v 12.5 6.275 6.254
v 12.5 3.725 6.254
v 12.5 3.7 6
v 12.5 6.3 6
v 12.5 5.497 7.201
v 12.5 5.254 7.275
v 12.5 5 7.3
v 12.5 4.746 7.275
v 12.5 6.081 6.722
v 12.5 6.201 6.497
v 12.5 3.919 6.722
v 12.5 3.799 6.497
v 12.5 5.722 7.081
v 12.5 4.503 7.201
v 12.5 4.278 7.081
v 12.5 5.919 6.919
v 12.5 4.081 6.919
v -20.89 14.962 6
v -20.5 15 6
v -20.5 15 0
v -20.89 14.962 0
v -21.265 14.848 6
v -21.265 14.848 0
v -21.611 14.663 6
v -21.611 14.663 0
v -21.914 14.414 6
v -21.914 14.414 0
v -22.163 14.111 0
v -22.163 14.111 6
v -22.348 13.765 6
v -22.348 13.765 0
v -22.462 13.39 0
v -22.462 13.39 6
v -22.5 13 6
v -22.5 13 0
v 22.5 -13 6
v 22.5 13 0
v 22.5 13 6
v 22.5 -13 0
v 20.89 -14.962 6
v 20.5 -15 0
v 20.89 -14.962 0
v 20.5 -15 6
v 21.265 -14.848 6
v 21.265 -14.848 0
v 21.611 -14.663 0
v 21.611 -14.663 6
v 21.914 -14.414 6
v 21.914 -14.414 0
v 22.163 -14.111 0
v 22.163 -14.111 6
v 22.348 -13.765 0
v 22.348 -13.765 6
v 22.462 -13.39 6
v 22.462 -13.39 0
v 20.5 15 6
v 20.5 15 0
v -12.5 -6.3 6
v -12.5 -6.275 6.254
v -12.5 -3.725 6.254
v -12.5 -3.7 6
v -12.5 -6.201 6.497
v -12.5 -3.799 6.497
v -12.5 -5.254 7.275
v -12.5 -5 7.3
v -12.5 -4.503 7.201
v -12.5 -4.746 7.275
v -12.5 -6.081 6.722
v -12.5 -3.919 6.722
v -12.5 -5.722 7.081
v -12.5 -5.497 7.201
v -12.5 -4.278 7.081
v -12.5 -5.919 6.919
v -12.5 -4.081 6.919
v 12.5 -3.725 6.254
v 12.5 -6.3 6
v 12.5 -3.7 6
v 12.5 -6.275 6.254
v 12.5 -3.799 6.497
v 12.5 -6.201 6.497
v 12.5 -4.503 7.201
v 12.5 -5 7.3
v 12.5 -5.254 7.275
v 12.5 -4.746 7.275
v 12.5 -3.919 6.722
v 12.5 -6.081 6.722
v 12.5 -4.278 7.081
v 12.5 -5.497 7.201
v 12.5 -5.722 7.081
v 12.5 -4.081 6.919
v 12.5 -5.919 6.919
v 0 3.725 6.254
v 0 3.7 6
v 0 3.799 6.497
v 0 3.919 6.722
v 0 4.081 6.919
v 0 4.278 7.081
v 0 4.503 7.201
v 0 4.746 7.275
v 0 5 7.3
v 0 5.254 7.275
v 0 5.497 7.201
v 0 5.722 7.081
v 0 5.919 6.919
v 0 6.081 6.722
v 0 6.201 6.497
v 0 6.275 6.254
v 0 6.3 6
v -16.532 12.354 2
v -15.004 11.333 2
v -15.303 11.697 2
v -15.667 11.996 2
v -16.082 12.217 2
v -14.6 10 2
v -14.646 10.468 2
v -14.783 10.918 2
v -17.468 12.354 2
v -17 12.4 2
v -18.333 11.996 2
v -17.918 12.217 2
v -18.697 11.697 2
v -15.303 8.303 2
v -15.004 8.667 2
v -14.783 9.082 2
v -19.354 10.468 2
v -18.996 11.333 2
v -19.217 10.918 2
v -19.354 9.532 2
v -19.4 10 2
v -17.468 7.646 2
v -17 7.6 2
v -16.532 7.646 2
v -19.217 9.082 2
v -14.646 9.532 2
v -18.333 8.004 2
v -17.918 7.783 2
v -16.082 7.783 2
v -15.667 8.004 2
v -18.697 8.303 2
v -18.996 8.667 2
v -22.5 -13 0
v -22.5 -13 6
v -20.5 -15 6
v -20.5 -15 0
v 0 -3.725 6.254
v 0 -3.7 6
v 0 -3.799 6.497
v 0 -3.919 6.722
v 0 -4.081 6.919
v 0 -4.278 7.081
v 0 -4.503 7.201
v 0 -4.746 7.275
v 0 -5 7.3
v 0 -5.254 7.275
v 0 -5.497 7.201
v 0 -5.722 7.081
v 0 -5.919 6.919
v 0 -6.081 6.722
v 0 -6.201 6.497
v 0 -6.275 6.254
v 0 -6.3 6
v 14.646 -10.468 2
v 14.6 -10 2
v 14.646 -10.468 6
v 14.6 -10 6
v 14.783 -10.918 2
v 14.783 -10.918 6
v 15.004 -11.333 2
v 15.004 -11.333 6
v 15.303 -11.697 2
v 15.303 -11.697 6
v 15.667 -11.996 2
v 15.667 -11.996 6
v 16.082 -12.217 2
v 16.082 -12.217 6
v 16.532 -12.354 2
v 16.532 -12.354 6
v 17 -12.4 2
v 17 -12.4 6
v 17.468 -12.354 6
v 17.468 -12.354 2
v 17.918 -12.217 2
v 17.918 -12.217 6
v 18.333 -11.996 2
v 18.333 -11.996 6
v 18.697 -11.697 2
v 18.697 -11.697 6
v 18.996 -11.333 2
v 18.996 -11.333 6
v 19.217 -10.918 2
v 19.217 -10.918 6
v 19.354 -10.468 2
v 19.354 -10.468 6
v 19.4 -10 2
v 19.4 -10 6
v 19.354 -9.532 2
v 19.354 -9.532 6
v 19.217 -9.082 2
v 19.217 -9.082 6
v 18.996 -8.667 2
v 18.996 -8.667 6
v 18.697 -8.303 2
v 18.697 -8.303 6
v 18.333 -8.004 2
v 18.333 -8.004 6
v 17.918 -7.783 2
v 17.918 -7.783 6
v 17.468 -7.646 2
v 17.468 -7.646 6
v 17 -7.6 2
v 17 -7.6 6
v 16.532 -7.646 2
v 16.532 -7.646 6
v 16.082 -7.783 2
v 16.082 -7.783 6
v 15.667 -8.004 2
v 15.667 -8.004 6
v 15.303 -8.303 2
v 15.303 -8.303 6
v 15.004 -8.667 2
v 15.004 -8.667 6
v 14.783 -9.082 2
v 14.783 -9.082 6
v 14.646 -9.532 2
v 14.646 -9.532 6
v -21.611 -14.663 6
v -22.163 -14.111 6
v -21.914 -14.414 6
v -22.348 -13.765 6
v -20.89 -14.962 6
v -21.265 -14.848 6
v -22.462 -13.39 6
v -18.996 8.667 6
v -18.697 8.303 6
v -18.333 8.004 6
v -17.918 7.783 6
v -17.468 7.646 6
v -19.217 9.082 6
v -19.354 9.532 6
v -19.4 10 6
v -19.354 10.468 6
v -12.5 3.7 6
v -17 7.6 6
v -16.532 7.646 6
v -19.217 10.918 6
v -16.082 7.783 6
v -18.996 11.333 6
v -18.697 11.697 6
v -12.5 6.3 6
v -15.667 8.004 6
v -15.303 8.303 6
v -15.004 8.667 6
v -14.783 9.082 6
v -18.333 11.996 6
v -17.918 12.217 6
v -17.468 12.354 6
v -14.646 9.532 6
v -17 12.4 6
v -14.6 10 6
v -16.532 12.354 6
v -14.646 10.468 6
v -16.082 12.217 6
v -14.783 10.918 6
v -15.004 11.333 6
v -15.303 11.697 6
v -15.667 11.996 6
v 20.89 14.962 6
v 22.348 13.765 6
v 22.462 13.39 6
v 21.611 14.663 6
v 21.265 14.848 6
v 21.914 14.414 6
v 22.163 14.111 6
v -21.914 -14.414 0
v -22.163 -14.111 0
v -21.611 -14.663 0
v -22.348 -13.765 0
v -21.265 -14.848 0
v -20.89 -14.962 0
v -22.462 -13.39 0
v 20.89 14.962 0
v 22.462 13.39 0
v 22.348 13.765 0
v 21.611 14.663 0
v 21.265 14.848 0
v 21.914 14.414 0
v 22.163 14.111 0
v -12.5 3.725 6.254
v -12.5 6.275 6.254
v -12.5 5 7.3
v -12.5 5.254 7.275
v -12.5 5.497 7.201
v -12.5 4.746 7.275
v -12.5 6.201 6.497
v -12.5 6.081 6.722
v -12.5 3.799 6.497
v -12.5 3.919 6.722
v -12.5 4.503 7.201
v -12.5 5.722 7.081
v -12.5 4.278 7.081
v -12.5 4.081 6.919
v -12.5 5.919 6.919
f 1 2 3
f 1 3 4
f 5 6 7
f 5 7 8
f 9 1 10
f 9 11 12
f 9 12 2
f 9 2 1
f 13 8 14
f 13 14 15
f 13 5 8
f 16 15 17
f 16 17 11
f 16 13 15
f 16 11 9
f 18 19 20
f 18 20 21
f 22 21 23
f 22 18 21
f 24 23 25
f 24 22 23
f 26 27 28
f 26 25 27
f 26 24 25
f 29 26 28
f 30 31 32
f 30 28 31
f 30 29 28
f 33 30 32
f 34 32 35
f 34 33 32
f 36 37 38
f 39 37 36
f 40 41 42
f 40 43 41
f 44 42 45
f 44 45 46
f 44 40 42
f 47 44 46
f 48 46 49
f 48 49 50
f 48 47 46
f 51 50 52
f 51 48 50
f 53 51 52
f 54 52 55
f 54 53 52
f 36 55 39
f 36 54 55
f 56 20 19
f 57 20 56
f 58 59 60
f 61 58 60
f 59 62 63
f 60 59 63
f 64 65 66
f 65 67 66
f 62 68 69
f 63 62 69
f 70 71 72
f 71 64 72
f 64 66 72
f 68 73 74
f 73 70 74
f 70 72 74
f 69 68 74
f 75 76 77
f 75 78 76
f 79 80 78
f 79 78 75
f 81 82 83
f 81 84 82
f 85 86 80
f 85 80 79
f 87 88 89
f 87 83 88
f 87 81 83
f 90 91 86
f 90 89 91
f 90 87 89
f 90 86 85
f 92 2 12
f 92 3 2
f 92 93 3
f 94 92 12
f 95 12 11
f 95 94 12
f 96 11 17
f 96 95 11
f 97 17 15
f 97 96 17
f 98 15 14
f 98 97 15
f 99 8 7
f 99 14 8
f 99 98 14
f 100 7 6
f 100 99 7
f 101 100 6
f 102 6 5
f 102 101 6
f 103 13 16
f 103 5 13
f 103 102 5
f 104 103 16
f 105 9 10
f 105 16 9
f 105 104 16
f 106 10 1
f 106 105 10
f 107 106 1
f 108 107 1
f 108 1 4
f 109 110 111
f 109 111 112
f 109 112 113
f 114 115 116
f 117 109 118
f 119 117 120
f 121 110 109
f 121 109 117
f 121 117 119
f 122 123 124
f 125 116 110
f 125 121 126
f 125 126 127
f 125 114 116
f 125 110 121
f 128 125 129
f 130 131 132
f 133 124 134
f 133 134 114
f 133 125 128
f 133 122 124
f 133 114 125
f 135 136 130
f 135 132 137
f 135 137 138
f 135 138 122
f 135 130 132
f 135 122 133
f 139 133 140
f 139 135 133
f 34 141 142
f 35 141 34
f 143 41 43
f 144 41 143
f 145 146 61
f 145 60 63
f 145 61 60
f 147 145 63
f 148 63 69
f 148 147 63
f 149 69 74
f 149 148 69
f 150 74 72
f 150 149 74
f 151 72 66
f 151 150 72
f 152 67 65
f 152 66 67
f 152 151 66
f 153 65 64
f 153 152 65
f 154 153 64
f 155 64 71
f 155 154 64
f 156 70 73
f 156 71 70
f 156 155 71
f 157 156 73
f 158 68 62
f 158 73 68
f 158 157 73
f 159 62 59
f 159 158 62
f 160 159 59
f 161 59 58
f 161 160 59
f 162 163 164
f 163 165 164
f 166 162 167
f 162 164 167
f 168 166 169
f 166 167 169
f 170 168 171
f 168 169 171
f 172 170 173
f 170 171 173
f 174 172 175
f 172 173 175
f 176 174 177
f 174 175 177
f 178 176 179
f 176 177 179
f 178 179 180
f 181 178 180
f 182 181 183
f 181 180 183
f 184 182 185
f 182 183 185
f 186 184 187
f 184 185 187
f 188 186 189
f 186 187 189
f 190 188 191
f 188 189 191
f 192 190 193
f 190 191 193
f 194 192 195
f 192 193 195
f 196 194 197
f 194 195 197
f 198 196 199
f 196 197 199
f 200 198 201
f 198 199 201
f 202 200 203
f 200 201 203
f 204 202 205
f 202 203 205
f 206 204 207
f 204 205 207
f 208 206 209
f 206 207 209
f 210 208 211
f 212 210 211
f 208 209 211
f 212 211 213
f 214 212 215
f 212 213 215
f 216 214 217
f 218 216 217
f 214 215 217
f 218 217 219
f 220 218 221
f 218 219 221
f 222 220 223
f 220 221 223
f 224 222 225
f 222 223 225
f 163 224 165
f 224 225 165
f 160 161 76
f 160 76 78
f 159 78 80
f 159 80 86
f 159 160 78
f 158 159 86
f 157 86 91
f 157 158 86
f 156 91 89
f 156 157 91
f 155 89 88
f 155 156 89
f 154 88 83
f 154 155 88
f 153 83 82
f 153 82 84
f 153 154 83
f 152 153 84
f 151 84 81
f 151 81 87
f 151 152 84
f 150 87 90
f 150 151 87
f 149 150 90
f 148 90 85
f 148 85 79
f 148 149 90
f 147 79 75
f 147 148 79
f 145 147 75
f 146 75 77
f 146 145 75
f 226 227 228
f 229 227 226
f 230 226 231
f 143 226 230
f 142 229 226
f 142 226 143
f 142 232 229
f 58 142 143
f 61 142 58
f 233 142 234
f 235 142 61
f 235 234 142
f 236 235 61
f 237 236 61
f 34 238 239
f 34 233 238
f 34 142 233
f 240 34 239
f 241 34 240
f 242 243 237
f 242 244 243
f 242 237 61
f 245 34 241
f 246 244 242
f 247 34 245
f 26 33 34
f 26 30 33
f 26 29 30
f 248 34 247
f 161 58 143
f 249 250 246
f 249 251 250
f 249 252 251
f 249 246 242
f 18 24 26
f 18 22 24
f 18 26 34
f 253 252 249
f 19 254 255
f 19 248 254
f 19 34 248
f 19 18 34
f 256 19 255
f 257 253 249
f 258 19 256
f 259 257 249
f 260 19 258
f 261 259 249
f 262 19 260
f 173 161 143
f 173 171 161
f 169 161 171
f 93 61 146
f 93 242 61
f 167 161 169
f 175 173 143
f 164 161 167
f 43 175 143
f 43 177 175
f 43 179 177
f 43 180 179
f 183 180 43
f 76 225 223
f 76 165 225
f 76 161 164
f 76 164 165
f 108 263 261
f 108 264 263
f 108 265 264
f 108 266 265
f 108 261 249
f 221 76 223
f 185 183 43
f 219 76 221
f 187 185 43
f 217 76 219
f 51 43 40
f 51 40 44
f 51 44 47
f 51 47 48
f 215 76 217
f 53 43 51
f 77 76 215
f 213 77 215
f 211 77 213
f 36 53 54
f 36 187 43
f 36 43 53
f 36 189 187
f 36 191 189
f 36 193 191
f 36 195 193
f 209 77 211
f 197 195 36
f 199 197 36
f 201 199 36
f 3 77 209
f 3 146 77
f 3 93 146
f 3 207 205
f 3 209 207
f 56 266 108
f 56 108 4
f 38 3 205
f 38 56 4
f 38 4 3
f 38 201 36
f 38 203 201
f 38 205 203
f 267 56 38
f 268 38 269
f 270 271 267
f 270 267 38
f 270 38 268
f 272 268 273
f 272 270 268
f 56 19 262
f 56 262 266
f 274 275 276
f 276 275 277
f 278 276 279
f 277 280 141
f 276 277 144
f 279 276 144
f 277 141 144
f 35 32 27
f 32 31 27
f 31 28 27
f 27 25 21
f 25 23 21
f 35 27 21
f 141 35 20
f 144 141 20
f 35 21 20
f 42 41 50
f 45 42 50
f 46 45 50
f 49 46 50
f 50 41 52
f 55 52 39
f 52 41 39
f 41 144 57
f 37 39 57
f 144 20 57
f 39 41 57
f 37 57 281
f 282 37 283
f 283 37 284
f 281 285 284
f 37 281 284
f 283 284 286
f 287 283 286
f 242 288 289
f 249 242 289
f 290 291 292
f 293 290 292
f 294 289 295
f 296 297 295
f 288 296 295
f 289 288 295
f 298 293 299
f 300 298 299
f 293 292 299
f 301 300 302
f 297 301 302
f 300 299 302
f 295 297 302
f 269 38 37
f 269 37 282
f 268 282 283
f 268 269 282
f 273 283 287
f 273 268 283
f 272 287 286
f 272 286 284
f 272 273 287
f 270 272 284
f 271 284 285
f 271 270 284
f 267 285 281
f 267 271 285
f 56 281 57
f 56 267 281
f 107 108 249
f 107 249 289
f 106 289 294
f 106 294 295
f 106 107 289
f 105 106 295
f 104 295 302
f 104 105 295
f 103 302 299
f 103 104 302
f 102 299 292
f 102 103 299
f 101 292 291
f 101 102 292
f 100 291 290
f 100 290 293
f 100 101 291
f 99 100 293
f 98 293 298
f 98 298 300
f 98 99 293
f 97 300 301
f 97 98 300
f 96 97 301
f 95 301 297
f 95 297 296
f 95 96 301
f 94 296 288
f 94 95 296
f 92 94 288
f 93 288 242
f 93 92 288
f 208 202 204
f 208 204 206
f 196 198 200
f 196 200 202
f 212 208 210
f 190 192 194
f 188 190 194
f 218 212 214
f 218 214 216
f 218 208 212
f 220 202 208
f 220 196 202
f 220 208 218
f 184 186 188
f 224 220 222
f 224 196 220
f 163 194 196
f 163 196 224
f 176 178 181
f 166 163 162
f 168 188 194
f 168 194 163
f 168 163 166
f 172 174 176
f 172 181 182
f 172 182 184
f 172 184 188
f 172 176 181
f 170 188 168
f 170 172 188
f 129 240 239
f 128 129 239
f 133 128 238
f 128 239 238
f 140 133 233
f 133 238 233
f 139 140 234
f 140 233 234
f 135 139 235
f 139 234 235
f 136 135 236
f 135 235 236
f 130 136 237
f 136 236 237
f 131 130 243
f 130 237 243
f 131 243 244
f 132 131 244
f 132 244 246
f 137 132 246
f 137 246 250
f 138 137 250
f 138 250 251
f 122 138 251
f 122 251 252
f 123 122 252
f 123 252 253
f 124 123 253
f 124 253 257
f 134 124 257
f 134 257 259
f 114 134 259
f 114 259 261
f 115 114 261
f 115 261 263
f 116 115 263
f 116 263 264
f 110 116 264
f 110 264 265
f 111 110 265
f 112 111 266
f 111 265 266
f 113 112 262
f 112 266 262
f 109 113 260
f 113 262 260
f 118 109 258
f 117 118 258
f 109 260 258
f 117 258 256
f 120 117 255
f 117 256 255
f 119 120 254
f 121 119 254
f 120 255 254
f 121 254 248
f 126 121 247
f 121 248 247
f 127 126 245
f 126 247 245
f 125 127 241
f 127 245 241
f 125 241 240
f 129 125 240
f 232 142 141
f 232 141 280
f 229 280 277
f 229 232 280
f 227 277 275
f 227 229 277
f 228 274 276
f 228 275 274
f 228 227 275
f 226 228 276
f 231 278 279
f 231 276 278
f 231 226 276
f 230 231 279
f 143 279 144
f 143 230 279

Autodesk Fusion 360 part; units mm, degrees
sketch "草图1" plane through (0, 0, 0) normal (0, 0, 1) x (1, 0, 0)
  line L0 (22.5, -15) -> (-22.5, -15)
  line L1 (-22.5, -15) -> (-22.5, 15)
  line L2 (-22.5, 15) -> (22.5, 15)
  line L3 (22.5, 15) -> (22.5, -15)
  line L4 (22.5, -15) -> (-22.5, 15) construction
  line L5 (-22.5, -15) -> (22.5, 15) construction
  dimension "d27" = 45
  dimension "d28" = 30
extrude "拉伸1" add sketch "草图1" along normal blind 6
sketch "草图2" plane through (0, 0, 0) normal (1, 0, 0) x (0, 1, 0)
sketch "草图3" plane through (0, 0, 0) normal (1, 0, 0) x (0, 1, 0)
  circle A0 centre (5, 6) radius 1.3
  dimension "d31" = 2.6
extrude "拉伸2" add sketch "草图3" along normal blind 12.5 and the other way blind 12.5
mirror "镜像1" about plane through (0, 0, 0) normal (0, 1, 0) of "拉伸2"
sketch "草图4" plane through (0, 0, 6) normal (0, 0, 1) x (-1, 0, 0)
  line L0 (12.5, 6.3) -> (12.5, 3.7)
  line L1 (12.5, 3.7) -> (-12.5, 3.7)
  line L2 (-12.5, 3.7) -> (-12.5, 6.3)
  line L3 (-12.5, 6.3) -> (12.5, 6.3)
  line L4 (12.5, -3.7) -> (12.5, -6.3)
  line L5 (12.5, -6.3) -> (-12.5, -6.3)
  line L6 (-12.5, -6.3) -> (-12.5, -3.7)
  line L7 (-12.5, -3.7) -> (12.5, -3.7)
  line L8 (-22.5, -15) -> (22.5, -15)
  line L9 (22.5, -15) -> (22.5, 15)
  line L10 (22.5, 15) -> (-22.5, 15)
  line L11 (-22.5, 15) -> (-22.5, -15)
fillet "圆角1" radius 2 4 edges at (22.5, 15, 3) (22.5, -15, 3) (-22.5, -15, 3) (-22.5, 15, 3)
sketch "草图5" plane through (0, 0, 6) normal (0, 0, 1) x (-1, 0, 0)
  line L0 (12.5, 6.3) -> (12.5, 3.7)
  line L1 (12.5, 3.7) -> (-12.5, 3.7)
  line L2 (-12.5, 3.7) -> (-12.5, 6.3)
  line L3 (-12.5, 6.3) -> (12.5, 6.3)
  line L4 (12.5, -3.7) -> (12.5, -6.3)
  line L5 (12.5, -6.3) -> (-12.5, -6.3)
  line L6 (-12.5, -6.3) -> (-12.5, -3.7)
  line L7 (-12.5, -3.7) -> (12.5, -3.7)
  arc A0 (20.5, -15) -> (22.5, -13) centre (20.5, -13) ccw
  line L8 (22.5, -13) -> (22.5, 13)
  arc A1 (22.5, 13) -> (20.5, 15) centre (20.5, 13) ccw
  line L9 (20.5, 15) -> (-20.5, 15)
  arc A2 (-20.5, 15) -> (-22.5, 13) centre (-20.5, 13) ccw
  line L10 (-22.5, 13) -> (-22.5, -13)
  arc A3 (-22.5, -13) -> (-20.5, -15) centre (-20.5, -13) ccw
  line L11 (-20.5, -15) -> (20.5, -15)
  circle A4 centre (-17, 10) radius 2.4
  dimension "d44" = 4.8
extrude "拉伸4" cut sketch "草图5" against normal blind 4 contours A4
sketch "草图6" plane through (0, 0, 6) normal (0, 0, 1) x (-1, 0, 0)
  circle A0 centre (-17, 10) radius 2.4
  line L0 (12.5, 6.3) -> (12.5, 3.7)
  line L1 (12.5, 3.7) -> (-12.5, 3.7)
  line L2 (-12.5, 3.7) -> (-12.5, 6.3)
  line L3 (-12.5, 6.3) -> (12.5, 6.3)
  line L4 (12.5, -3.7) -> (12.5, -6.3)
  line L5 (12.5, -6.3) -> (-12.5, -6.3)
  line L6 (-12.5, -6.3) -> (-12.5, -3.7)
  line L7 (-12.5, -3.7) -> (12.5, -3.7)
  arc A1 (20.5, -15) -> (22.5, -13) centre (20.5, -13) ccw
  line L8 (22.5, -13) -> (22.5, 13)
  arc A2 (22.5, 13) -> (20.5, 15) centre (20.5, 13) ccw
  line L9 (20.5, 15) -> (-20.5, 15)
  arc A3 (-20.5, 15) -> (-22.5, 13) centre (-20.5, 13) ccw
  line L10 (-22.5, 13) -> (-22.5, -13)
  arc A4 (-22.5, -13) -> (-20.5, -15) centre (-20.5, -13) ccw
  line L11 (-20.5, -15) -> (20.5, -15)
  circle A5 centre (17, -10) radius 2.4
  dimension "d47" = 4.8
extrude "拉伸5" cut sketch "草图6" against normal blind 4 contours A5
equation "Catheter_Diameter = 2.4 mm" comment "Flexible spring catheter outer diameter"
equation "Catheter_Assembly_Clearance = 0.2 mm" comment "Initial diametral assembly clearance between catheter and Ecoflex liner"
equation "Clamp_Groove_Diameter = 3.6 mm" comment "Hard clamp circular groove diameter"
equation "Pad_Outer_Diameter = Clamp_Groove_Diameter" comment "Ecoflex liner outer diameter driven by clamp groove"
equation "Pad_Outer_Radius = Pad_Outer_Diameter / 2" comment "Ecoflex liner outer radius"
equation "Pad_Inner_Diameter = Catheter_Diameter + Catheter_Assembly_Clearance" comment "Ecoflex liner inner diameter"
equation "Pad_Inner_Radius = Pad_Inner_Diameter / 2" comment "Ecoflex liner inner radius"
equation "Pad_Radial_Thickness = ( Pad_Outer_Diameter - Pad_Inner_Diameter ) / 2" comment "Nominal radial thickness of Ecoflex liner"
equation "Pad_Length = 25 mm" comment "Effective Ecoflex liner length"
equation "Mold_Length = 45 mm" comment "Overall mold length along X"
equation "Mold_Width = 30 mm" comment "Overall mold width along Y"
equation "Bottom_Mold_Thickness = 8 mm" comment "Bottom mold plate thickness"
equation "Top_Mold_Thickness = 6 mm" comment "Top mold plate thickness"
equation "Top_Mold_Base_Z = Bottom_Mold_Thickness" comment "Assembly Z height of top mold bottom parting face"
equation "Pad_Cavity_Offset_Y = 5 mm" comment "Centerline offset of the two cavities from mold center"
equation "Alignment_Pin_Diameter = 4 mm" comment "Printed alignment pin diameter on bottom mold"
equation "Alignment_Pin_Height = 3 mm" comment "Alignment pin height"
equation "Alignment_Hole_Diameter = 4.4 mm" comment "Alignment blind-hole diameter on top mold"
equation "Alignment_Hole_Depth = 3.4 mm" comment "Alignment blind-hole depth"
equation "Alignment_Pin_Offset_X = 17 mm" comment "Absolute X coordinate magnitude of alignment pins"
equation "Alignment_Pin_Offset_Y = 10 mm" comment "Absolute Y coordinate magnitude of alignment pins"
equation "Overflow_Channel_Width = 1 mm" comment "Optional V1 overflow-channel width; retained but not used in recommended V1"
equation "Overflow_Channel_Depth = 0.4 mm" comment "Optional V1 overflow-channel depth; retained but not used in recommended V1"
equation "Overflow_Well_Diameter = 6 mm" comment "Optional overflow-well diameter; retained but not used in recommended V1"
equation "Overflow_Well_Depth = 1 mm" comment "Optional overflow-well depth; retained but not used in recommended V1"
equation "Mold_Outer_Fillet = 2 mm" comment "External handling-edge fillet radius"
equation "d27 = Mold_Length"
equation "d28 = Mold_Width"
equation "d29 = Top_Mold_Thickness"
equation "d31 = Pad_Inner_Diameter"
equation "d32 = Pad_Length / 2"
equation "d34 = Pad_Length / 2"
equation "d43 = Mold_Outer_Fillet"
